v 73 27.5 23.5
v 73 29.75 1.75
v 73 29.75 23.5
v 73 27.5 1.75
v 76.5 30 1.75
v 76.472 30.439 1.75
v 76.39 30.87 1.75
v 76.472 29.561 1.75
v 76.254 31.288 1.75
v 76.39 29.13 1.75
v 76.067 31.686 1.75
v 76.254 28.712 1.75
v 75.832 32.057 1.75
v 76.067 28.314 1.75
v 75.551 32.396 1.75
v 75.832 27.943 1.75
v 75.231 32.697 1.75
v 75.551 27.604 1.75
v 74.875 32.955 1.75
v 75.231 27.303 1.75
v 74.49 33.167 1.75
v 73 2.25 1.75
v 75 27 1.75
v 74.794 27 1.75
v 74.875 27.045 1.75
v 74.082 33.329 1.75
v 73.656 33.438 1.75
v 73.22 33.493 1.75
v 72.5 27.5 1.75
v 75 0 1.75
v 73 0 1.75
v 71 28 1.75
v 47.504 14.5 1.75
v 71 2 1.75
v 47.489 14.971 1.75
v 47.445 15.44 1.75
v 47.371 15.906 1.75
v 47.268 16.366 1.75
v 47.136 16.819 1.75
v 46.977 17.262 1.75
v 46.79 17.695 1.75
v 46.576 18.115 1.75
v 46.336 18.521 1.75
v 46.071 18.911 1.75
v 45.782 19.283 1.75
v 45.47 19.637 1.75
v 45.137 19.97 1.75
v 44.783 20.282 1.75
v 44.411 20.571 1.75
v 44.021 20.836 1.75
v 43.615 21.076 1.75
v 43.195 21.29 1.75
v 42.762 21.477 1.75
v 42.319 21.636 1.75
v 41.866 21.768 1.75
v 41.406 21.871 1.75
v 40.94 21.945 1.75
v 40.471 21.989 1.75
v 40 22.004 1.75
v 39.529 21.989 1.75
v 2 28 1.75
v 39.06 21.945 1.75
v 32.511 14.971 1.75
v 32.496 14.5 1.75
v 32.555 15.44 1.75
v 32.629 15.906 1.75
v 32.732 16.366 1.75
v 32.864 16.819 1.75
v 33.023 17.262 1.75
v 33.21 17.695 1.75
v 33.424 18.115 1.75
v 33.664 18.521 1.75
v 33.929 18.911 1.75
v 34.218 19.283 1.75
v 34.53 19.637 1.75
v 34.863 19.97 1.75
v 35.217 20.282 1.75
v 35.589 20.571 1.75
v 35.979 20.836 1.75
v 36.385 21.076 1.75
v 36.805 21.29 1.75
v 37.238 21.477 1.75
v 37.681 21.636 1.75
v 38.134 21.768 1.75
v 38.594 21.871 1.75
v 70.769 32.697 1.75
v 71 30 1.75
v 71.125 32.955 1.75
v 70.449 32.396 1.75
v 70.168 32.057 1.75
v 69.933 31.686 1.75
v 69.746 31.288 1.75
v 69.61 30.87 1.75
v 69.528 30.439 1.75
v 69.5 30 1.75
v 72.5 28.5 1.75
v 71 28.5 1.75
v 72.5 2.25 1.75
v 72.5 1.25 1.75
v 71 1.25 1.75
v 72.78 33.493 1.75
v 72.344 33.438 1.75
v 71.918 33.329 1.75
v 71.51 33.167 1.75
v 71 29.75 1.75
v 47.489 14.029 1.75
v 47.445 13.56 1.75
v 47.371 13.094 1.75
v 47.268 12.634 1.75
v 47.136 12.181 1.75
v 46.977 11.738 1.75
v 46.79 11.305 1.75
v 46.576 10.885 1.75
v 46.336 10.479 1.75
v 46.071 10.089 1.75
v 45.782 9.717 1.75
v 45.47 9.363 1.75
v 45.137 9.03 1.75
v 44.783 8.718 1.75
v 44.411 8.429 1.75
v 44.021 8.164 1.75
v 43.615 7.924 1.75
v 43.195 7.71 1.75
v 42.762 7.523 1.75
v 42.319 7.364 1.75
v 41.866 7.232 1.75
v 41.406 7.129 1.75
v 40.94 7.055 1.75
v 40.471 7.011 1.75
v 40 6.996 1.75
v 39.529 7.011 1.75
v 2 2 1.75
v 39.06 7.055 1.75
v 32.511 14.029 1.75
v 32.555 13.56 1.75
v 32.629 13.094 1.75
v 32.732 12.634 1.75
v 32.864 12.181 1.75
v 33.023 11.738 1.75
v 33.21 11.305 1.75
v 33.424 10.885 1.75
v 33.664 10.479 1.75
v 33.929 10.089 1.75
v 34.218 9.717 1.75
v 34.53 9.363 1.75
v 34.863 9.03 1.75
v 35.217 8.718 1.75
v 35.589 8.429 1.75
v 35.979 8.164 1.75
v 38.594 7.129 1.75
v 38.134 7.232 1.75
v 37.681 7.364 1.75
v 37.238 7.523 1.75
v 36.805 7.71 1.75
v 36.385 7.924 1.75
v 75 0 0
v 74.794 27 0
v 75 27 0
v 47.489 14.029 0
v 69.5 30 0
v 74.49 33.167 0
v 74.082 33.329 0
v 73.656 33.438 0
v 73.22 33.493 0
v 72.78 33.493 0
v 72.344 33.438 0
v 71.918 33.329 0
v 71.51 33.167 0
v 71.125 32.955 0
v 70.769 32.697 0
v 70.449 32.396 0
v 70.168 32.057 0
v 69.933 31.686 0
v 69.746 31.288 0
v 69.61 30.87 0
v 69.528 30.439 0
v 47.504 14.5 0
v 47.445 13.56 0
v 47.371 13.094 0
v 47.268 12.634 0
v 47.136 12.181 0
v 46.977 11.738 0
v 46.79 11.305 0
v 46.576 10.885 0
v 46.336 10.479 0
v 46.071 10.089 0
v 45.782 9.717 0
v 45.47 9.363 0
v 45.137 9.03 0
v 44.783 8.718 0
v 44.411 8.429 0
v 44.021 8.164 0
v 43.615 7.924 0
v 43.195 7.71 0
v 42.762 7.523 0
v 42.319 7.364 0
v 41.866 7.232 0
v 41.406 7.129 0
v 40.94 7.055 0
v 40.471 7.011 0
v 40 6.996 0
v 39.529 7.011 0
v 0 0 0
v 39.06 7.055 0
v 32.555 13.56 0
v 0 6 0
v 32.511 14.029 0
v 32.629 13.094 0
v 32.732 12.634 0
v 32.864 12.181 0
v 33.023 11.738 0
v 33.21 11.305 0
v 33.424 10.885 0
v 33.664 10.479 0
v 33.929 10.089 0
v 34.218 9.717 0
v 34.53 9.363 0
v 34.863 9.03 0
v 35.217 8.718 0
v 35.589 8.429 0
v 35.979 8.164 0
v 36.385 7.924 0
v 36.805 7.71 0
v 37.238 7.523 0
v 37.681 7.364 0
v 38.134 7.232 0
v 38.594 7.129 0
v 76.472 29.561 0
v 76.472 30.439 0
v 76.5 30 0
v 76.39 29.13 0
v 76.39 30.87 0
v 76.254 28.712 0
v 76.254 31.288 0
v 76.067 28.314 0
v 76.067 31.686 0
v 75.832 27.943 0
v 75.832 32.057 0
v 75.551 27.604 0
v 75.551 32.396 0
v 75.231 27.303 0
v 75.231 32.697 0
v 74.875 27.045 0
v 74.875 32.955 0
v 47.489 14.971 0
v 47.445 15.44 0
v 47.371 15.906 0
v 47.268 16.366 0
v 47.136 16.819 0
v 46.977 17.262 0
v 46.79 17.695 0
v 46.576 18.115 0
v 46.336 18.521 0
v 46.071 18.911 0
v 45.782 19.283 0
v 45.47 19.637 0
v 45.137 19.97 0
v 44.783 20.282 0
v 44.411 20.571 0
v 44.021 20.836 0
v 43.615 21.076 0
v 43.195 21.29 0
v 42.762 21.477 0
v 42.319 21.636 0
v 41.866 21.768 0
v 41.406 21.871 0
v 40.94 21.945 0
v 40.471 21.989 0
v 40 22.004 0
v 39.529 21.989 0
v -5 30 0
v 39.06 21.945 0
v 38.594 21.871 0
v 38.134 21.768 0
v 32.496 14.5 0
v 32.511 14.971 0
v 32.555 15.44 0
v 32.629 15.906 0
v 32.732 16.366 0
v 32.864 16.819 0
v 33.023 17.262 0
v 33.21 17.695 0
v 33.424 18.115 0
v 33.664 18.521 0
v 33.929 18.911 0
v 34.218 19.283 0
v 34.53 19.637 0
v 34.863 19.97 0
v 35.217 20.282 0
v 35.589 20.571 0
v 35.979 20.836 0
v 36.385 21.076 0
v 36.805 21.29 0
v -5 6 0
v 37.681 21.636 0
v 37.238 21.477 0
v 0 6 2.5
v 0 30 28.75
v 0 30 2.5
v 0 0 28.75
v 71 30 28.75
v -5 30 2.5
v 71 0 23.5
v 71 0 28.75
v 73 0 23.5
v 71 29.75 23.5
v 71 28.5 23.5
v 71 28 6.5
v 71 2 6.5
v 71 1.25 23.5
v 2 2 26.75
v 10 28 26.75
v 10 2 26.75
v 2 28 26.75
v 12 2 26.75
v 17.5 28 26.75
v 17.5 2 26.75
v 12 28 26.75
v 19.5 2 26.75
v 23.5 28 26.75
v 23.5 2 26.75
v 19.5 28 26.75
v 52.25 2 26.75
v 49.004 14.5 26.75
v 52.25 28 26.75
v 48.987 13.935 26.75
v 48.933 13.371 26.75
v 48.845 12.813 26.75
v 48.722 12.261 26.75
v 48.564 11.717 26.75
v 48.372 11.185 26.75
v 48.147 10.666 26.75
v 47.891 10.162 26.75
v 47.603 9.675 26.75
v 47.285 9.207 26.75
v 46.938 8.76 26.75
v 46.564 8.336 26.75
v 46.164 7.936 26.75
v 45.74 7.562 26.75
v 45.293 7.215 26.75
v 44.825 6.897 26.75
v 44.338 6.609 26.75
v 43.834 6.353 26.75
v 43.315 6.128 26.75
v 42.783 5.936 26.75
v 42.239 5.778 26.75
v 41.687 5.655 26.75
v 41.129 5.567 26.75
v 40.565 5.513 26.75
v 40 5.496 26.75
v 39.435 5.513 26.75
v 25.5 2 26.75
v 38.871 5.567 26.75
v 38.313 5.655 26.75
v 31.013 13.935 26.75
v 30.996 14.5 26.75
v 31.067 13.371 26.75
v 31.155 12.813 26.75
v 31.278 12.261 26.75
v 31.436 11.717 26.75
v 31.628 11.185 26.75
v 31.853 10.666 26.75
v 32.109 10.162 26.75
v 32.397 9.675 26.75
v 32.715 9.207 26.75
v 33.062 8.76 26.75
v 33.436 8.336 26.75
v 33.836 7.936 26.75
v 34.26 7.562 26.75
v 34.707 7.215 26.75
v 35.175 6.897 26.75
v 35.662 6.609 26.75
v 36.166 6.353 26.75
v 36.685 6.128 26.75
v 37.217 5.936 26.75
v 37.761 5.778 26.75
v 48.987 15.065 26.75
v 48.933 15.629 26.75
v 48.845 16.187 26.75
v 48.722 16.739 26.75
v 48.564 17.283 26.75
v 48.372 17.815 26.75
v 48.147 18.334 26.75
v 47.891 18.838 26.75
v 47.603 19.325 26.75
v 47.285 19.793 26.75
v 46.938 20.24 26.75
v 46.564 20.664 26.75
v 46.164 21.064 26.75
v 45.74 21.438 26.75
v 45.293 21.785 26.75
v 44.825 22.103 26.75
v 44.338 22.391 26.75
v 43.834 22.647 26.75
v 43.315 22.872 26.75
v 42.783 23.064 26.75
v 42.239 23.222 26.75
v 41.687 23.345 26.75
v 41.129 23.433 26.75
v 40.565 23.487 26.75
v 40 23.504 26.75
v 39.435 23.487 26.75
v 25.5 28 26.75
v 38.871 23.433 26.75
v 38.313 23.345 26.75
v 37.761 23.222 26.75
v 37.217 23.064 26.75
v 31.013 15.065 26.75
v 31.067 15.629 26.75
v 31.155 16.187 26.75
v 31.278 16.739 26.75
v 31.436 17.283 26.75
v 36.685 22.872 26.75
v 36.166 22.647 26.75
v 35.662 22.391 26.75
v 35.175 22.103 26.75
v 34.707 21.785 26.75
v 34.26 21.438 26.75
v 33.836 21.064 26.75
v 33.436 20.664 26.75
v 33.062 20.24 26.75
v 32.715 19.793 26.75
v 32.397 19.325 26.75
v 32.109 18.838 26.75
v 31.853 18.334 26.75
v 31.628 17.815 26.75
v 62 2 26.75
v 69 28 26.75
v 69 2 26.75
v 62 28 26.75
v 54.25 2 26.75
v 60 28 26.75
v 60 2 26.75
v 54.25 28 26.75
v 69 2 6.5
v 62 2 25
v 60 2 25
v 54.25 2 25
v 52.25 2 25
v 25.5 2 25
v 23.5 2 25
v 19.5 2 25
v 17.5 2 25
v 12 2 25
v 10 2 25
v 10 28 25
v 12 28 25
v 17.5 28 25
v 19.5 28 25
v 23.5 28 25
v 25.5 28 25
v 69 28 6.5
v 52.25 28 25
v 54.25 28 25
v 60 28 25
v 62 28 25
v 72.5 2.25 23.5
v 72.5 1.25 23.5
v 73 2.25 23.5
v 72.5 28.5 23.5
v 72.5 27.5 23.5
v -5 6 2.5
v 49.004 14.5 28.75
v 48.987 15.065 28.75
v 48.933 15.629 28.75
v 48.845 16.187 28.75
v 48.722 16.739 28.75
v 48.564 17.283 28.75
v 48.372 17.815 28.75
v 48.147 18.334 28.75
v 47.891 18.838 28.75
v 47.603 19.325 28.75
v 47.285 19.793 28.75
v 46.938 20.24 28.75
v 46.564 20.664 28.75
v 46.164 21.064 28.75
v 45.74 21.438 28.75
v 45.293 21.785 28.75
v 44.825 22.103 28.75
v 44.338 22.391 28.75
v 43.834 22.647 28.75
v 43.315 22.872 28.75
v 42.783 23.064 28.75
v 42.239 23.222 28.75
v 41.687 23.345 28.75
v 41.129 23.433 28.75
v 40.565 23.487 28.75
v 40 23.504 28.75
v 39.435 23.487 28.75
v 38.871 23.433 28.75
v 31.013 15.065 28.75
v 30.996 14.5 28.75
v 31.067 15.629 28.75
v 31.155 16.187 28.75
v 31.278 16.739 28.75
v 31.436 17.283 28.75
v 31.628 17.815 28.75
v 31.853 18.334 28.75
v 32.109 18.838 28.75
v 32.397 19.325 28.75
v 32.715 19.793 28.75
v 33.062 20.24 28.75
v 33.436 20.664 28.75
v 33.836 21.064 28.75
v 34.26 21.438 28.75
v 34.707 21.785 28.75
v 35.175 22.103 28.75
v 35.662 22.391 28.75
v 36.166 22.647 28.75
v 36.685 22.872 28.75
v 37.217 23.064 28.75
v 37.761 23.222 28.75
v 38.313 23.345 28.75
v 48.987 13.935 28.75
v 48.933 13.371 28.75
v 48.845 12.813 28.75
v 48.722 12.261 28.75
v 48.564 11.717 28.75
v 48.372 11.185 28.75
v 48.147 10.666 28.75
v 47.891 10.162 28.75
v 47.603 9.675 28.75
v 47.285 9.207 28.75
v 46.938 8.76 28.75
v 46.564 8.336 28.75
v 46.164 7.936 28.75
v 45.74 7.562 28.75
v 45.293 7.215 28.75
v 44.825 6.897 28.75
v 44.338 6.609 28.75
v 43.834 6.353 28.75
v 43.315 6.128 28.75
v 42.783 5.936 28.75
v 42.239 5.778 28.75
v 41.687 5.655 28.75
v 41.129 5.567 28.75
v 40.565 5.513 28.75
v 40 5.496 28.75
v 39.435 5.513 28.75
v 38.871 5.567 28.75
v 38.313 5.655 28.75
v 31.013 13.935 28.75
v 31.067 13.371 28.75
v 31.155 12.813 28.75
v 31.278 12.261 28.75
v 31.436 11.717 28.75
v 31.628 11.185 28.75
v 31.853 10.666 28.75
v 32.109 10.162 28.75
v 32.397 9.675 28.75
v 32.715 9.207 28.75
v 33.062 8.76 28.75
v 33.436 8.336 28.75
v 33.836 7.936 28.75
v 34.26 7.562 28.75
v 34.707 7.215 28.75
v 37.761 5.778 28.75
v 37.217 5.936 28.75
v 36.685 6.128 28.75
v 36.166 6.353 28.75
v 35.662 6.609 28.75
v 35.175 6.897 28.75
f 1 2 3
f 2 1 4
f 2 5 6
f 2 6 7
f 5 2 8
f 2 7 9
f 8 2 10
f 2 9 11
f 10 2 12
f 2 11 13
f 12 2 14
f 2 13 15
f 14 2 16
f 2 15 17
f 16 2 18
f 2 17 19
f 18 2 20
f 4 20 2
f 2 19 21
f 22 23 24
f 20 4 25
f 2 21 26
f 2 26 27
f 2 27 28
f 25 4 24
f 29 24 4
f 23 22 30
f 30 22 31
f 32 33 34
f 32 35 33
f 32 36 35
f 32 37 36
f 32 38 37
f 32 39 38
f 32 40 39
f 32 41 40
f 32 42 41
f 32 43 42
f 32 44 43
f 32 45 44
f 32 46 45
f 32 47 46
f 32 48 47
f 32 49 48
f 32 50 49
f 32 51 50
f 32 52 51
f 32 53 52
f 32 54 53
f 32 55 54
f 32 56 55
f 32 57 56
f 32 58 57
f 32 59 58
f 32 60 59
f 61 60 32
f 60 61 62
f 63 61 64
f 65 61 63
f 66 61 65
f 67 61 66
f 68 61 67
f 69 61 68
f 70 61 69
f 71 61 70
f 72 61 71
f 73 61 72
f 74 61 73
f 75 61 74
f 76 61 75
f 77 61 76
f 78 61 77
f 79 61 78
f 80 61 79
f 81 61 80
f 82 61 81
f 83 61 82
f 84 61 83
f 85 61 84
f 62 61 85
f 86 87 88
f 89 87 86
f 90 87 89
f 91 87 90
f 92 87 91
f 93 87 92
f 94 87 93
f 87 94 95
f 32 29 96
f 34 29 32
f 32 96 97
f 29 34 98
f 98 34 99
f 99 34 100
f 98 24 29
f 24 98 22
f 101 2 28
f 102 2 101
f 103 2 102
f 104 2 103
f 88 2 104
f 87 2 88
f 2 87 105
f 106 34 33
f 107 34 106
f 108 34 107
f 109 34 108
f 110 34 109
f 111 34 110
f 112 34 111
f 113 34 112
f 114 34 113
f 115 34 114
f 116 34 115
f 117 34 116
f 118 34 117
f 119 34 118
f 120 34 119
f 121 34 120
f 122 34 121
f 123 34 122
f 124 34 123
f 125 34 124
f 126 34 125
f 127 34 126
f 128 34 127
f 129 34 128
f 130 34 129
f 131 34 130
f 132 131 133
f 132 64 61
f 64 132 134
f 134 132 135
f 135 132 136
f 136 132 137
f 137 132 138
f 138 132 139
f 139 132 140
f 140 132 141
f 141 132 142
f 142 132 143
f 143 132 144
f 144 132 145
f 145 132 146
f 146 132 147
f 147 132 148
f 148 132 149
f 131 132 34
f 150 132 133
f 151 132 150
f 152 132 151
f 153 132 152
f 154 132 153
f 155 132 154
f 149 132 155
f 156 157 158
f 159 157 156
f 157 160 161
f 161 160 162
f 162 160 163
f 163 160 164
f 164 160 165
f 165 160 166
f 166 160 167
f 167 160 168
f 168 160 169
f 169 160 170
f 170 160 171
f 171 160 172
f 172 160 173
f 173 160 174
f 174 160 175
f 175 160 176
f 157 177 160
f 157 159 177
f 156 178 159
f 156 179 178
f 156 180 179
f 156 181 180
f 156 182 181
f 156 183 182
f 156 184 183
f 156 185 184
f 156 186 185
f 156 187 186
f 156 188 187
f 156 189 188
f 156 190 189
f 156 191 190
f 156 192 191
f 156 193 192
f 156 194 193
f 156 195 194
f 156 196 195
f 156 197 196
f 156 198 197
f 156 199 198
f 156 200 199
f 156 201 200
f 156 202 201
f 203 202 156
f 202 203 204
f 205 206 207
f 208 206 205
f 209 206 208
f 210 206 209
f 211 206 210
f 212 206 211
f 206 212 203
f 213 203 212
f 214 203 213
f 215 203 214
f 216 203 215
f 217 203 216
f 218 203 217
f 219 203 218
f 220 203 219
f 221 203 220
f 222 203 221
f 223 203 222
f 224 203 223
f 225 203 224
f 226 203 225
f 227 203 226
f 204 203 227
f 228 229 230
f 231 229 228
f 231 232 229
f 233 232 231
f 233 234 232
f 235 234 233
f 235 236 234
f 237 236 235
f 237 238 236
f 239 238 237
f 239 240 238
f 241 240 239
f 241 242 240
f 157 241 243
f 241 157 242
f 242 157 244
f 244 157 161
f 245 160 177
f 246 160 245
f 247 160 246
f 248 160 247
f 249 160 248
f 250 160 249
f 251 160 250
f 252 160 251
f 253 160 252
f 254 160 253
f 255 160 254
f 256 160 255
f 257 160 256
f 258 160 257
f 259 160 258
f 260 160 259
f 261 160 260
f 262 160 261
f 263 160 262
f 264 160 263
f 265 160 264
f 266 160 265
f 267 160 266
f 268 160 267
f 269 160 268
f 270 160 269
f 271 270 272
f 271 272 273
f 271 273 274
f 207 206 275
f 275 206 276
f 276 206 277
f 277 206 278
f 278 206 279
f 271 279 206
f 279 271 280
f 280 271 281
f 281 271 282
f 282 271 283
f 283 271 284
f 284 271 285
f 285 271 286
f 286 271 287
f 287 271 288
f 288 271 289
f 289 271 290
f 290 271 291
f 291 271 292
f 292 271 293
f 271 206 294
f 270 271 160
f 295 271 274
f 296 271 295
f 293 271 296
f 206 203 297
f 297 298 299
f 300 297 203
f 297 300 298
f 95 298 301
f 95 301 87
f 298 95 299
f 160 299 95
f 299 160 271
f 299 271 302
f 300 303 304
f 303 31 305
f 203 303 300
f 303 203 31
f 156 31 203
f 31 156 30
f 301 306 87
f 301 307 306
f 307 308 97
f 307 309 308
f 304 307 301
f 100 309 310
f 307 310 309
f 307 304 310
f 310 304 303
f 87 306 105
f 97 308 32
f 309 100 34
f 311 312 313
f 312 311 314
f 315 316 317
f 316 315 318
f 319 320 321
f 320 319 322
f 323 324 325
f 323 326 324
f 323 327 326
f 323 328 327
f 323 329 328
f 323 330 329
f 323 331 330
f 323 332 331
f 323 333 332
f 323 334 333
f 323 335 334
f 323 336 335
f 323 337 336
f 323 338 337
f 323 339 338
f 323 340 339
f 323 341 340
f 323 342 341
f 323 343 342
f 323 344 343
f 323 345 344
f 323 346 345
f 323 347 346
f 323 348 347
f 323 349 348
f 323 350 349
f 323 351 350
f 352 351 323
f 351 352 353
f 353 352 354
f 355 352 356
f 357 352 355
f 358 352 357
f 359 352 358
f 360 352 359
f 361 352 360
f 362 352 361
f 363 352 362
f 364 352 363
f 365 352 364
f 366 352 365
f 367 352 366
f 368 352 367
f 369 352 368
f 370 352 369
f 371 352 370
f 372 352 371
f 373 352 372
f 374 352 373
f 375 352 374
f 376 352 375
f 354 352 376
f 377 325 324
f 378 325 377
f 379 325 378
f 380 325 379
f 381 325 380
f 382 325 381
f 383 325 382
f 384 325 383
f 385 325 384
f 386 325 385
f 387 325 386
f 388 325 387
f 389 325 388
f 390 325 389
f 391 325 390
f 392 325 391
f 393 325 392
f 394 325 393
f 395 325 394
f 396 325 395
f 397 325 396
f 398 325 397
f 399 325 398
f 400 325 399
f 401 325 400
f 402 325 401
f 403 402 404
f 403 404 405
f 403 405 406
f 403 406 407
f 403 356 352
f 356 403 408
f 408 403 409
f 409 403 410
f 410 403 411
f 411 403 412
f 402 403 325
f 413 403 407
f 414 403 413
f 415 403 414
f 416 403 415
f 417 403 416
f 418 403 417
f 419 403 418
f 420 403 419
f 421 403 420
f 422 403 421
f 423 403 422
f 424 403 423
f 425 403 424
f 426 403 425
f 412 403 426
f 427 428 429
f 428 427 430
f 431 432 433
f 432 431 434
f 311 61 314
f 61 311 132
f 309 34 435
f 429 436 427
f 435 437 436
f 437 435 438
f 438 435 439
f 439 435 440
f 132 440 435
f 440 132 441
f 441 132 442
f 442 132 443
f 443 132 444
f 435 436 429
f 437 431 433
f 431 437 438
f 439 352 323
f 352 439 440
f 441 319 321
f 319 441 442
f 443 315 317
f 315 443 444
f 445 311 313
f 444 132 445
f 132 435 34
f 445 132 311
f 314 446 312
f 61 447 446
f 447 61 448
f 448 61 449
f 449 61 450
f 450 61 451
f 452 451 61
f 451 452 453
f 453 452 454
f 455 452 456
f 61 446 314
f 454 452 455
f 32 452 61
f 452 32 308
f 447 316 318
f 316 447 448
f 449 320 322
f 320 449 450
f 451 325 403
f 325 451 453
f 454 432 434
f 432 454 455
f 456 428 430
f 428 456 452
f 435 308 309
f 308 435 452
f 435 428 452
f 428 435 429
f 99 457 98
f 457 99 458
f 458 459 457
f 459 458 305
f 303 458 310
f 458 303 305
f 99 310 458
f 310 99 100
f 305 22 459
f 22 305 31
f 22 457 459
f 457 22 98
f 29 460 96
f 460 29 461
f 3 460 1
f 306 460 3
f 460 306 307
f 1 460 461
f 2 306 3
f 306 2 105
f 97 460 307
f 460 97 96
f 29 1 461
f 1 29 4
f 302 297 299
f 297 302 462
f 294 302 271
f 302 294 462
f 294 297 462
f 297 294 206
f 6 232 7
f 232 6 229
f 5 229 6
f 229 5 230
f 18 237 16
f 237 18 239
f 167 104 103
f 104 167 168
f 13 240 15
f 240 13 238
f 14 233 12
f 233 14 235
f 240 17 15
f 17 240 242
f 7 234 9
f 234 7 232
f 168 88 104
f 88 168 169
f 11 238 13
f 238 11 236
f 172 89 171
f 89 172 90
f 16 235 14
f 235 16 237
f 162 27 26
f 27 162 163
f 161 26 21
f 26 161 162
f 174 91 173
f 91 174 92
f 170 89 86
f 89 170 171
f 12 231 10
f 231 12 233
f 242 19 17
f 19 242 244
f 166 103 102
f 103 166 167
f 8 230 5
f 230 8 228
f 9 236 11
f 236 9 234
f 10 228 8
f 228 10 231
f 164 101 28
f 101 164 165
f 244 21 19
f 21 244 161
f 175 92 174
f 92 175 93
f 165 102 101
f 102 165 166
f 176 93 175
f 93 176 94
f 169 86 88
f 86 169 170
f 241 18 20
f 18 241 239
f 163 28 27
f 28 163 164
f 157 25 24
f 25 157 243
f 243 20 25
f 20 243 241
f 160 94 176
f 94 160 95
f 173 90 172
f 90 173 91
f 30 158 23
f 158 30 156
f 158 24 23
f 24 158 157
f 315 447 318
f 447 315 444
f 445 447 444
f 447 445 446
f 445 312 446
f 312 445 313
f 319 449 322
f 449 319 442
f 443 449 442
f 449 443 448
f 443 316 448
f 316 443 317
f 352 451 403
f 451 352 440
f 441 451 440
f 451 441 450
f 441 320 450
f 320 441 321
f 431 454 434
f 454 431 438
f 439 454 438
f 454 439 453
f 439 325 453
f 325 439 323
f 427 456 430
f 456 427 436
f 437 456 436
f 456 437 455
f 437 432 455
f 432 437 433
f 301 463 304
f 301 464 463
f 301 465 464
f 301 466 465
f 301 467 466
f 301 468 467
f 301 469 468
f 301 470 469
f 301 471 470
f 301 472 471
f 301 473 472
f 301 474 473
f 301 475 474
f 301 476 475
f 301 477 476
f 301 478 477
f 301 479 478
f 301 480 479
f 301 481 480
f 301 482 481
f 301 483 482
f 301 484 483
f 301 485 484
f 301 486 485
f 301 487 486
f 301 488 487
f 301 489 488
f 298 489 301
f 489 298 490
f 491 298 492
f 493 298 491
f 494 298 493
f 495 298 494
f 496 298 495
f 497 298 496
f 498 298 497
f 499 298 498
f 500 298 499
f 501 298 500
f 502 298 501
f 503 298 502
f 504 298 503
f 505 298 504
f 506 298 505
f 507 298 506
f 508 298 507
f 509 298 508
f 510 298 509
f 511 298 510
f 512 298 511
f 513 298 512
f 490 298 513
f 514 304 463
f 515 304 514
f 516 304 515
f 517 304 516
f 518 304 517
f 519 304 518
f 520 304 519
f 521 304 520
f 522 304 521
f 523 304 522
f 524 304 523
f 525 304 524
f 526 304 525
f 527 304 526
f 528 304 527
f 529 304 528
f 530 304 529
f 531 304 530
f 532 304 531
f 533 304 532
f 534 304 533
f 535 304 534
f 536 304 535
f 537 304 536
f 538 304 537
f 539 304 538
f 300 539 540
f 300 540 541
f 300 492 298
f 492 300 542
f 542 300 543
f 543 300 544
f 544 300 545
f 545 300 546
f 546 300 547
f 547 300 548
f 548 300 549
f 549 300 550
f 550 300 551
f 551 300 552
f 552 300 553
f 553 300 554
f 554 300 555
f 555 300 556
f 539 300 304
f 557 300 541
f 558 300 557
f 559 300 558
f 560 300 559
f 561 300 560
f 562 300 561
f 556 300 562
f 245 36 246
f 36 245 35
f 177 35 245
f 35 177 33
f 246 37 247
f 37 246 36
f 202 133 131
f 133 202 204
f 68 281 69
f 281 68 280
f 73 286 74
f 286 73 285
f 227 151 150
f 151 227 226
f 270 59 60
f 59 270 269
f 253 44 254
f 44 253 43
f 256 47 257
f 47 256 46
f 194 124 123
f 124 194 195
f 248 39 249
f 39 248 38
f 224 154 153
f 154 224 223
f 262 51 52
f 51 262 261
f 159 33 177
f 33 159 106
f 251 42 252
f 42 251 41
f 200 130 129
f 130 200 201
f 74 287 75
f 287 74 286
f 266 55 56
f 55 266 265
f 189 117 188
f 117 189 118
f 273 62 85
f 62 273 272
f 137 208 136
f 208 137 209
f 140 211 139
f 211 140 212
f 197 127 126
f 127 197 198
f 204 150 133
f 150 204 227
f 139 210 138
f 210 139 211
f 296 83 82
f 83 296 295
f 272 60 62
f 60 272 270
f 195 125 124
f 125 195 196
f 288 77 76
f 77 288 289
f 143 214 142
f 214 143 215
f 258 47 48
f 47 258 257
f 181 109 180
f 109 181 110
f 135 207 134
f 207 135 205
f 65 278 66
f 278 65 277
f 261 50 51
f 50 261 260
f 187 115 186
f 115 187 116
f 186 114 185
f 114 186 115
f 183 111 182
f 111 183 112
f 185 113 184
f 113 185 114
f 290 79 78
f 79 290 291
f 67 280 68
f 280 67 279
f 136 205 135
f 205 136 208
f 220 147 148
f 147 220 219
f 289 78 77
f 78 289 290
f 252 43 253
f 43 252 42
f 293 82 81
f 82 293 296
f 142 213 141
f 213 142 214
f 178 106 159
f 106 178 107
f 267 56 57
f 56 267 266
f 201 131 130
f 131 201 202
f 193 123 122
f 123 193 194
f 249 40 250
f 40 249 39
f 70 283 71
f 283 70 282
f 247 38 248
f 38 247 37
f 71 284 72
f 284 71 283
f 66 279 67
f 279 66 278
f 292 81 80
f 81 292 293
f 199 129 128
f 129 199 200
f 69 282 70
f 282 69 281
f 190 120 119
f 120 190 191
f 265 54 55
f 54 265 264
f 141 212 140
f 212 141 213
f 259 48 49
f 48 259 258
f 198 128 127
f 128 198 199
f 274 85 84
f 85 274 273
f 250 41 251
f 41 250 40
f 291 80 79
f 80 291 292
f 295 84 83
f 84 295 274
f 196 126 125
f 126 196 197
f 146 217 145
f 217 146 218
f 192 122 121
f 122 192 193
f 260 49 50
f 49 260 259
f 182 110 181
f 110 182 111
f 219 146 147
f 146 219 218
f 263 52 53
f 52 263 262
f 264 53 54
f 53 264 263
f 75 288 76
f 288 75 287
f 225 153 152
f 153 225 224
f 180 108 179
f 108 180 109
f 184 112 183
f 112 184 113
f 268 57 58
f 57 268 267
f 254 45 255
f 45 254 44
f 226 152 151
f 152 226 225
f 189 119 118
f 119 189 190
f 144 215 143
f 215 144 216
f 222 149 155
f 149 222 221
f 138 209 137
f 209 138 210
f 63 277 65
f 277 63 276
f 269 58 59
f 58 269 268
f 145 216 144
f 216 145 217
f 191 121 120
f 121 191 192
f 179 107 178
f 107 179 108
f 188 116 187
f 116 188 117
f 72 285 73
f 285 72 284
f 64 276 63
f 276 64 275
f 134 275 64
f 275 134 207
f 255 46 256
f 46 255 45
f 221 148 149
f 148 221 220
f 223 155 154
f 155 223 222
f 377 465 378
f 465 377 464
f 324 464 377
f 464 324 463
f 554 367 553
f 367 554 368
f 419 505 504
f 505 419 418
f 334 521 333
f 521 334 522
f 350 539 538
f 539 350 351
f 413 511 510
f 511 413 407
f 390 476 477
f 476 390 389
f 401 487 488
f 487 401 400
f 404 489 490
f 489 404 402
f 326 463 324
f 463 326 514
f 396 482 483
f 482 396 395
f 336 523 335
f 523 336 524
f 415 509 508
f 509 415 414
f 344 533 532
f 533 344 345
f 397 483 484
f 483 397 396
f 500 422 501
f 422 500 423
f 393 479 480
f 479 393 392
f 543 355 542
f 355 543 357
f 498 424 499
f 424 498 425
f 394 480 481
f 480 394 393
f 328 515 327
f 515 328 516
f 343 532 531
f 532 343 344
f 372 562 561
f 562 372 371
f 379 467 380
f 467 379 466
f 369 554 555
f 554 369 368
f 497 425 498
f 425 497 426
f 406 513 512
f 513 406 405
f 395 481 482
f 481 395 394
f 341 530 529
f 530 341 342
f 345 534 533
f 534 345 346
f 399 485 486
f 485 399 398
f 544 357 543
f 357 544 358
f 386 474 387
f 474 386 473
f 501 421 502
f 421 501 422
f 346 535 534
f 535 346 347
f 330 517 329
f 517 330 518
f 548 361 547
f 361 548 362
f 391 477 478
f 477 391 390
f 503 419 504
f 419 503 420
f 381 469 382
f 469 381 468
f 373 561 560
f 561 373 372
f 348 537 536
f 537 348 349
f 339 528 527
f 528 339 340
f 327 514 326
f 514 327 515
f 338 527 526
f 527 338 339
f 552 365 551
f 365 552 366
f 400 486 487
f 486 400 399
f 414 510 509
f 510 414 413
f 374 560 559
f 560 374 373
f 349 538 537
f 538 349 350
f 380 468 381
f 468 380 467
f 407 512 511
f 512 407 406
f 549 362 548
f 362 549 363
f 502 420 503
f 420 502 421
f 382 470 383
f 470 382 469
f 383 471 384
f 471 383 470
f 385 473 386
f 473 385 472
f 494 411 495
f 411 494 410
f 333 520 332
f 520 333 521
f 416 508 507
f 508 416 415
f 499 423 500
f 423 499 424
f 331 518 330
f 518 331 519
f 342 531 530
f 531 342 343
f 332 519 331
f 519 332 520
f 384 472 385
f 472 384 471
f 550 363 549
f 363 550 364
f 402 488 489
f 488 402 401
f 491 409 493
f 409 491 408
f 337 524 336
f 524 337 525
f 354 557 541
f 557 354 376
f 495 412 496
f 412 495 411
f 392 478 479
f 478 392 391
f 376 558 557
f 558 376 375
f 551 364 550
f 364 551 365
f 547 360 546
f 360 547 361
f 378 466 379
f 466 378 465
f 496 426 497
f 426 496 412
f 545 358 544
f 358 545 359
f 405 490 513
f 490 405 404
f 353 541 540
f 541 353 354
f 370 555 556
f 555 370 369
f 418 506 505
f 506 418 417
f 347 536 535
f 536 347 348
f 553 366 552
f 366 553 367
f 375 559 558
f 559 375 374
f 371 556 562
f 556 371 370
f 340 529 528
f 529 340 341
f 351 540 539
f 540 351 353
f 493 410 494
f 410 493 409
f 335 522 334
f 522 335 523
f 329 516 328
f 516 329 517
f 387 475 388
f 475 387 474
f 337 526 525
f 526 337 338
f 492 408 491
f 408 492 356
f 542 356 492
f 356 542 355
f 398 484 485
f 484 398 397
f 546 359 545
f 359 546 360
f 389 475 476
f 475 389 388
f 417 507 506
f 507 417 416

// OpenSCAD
// Gimme Shelter Box
difference() {
    union() {
        // GSB Base
        cube([73,30,1.75]);
        
        // GSB Sides
        translate([2, 0, 1.75]) {
            color([1,0,0])
            cube([69,2,25]);
        }
        translate([2, 28, 1.75]) {
            color([0,0,1])
            cube([69,2,25]);
        }
       // GSB Rear
       translate([0, 0, 1.75]) {
             color([0,1,0])
             cube([2,30,25]);
       }
       
       // GSB Front
       translate([69, 2, 6.5]) {
             color([1,1,1])
             cube([2,26,20.25]);
       }
       
       // Door Slide Left
         translate([71, 0, 1.5]) {
             color([0,.75,.5])
             cube([1.5,1.25,22]);
       }
        translate([72.5, 0, 1.5]) {
             color([.6,.75,.5])
             cube([.5,2.25,22]);
       }
       
        // Door Slide Right
         translate([71, 28.5, 1.5]) {
             color([0,.75,.5])
             cube([1.5,1.25,22]);
       }
        translate([72.5, 27.5, 1.5]) {
             color([.6,.75,.5])
             cube([.5,2.25,22]);
       }
       
       // Left caliper hard point
       translate([-5,6,0]) {
           color([1,0,1])
           cube([5,24,2.5]);
       }
       
       // Right caliper hard point circle
       translate([73,30,0]) {
           color([0,1,1])
           cylinder(h=1.75, d=7, $fn=50);
       }
       
       // Right caliper hard point rectangle
       translate([73,0,0]) {
           color([1,1,0])
           cube([2,27,1.75]);
       }
       // GSB Top Supports
       translate([10, 1.5, 25]) {
             color([0,1,1])
             cube([2,27,2]);
       }
       
       translate([17.5, 1.5, 25]) {
             color([0,1,1])
             cube([2,27,2]);
       }
       translate([23.5, 1.5, 25]) {
             color([0,1,1])
             cube([2,27,2]);
       }
       translate([52.25, 1.5, 25]) {
             color([0,1,1])
             cube([2,27,2]);
       }
       translate([60, 1.5, 25]) {
             color([0,1,1])
             cube([2,27,2]);
       }
      
       // GSB Top
       translate([0,0,26.75]) {
        color([1,.5,.5])
        cube([71,30,2]);
       }
    }
    
    // Slide Well
    translate([40,14.5,-1]) cylinder_outer(8,7.5,100);
    // Objective Hole
    translate([40,14.5,24]) cylinder_outer(5,9,100);
}

module cylinder_outer(height,radius,fn){
   fudge = 1/cos(180/fn);
   cylinder(h=height,r=radius*fudge,$fn=fn);
    }
